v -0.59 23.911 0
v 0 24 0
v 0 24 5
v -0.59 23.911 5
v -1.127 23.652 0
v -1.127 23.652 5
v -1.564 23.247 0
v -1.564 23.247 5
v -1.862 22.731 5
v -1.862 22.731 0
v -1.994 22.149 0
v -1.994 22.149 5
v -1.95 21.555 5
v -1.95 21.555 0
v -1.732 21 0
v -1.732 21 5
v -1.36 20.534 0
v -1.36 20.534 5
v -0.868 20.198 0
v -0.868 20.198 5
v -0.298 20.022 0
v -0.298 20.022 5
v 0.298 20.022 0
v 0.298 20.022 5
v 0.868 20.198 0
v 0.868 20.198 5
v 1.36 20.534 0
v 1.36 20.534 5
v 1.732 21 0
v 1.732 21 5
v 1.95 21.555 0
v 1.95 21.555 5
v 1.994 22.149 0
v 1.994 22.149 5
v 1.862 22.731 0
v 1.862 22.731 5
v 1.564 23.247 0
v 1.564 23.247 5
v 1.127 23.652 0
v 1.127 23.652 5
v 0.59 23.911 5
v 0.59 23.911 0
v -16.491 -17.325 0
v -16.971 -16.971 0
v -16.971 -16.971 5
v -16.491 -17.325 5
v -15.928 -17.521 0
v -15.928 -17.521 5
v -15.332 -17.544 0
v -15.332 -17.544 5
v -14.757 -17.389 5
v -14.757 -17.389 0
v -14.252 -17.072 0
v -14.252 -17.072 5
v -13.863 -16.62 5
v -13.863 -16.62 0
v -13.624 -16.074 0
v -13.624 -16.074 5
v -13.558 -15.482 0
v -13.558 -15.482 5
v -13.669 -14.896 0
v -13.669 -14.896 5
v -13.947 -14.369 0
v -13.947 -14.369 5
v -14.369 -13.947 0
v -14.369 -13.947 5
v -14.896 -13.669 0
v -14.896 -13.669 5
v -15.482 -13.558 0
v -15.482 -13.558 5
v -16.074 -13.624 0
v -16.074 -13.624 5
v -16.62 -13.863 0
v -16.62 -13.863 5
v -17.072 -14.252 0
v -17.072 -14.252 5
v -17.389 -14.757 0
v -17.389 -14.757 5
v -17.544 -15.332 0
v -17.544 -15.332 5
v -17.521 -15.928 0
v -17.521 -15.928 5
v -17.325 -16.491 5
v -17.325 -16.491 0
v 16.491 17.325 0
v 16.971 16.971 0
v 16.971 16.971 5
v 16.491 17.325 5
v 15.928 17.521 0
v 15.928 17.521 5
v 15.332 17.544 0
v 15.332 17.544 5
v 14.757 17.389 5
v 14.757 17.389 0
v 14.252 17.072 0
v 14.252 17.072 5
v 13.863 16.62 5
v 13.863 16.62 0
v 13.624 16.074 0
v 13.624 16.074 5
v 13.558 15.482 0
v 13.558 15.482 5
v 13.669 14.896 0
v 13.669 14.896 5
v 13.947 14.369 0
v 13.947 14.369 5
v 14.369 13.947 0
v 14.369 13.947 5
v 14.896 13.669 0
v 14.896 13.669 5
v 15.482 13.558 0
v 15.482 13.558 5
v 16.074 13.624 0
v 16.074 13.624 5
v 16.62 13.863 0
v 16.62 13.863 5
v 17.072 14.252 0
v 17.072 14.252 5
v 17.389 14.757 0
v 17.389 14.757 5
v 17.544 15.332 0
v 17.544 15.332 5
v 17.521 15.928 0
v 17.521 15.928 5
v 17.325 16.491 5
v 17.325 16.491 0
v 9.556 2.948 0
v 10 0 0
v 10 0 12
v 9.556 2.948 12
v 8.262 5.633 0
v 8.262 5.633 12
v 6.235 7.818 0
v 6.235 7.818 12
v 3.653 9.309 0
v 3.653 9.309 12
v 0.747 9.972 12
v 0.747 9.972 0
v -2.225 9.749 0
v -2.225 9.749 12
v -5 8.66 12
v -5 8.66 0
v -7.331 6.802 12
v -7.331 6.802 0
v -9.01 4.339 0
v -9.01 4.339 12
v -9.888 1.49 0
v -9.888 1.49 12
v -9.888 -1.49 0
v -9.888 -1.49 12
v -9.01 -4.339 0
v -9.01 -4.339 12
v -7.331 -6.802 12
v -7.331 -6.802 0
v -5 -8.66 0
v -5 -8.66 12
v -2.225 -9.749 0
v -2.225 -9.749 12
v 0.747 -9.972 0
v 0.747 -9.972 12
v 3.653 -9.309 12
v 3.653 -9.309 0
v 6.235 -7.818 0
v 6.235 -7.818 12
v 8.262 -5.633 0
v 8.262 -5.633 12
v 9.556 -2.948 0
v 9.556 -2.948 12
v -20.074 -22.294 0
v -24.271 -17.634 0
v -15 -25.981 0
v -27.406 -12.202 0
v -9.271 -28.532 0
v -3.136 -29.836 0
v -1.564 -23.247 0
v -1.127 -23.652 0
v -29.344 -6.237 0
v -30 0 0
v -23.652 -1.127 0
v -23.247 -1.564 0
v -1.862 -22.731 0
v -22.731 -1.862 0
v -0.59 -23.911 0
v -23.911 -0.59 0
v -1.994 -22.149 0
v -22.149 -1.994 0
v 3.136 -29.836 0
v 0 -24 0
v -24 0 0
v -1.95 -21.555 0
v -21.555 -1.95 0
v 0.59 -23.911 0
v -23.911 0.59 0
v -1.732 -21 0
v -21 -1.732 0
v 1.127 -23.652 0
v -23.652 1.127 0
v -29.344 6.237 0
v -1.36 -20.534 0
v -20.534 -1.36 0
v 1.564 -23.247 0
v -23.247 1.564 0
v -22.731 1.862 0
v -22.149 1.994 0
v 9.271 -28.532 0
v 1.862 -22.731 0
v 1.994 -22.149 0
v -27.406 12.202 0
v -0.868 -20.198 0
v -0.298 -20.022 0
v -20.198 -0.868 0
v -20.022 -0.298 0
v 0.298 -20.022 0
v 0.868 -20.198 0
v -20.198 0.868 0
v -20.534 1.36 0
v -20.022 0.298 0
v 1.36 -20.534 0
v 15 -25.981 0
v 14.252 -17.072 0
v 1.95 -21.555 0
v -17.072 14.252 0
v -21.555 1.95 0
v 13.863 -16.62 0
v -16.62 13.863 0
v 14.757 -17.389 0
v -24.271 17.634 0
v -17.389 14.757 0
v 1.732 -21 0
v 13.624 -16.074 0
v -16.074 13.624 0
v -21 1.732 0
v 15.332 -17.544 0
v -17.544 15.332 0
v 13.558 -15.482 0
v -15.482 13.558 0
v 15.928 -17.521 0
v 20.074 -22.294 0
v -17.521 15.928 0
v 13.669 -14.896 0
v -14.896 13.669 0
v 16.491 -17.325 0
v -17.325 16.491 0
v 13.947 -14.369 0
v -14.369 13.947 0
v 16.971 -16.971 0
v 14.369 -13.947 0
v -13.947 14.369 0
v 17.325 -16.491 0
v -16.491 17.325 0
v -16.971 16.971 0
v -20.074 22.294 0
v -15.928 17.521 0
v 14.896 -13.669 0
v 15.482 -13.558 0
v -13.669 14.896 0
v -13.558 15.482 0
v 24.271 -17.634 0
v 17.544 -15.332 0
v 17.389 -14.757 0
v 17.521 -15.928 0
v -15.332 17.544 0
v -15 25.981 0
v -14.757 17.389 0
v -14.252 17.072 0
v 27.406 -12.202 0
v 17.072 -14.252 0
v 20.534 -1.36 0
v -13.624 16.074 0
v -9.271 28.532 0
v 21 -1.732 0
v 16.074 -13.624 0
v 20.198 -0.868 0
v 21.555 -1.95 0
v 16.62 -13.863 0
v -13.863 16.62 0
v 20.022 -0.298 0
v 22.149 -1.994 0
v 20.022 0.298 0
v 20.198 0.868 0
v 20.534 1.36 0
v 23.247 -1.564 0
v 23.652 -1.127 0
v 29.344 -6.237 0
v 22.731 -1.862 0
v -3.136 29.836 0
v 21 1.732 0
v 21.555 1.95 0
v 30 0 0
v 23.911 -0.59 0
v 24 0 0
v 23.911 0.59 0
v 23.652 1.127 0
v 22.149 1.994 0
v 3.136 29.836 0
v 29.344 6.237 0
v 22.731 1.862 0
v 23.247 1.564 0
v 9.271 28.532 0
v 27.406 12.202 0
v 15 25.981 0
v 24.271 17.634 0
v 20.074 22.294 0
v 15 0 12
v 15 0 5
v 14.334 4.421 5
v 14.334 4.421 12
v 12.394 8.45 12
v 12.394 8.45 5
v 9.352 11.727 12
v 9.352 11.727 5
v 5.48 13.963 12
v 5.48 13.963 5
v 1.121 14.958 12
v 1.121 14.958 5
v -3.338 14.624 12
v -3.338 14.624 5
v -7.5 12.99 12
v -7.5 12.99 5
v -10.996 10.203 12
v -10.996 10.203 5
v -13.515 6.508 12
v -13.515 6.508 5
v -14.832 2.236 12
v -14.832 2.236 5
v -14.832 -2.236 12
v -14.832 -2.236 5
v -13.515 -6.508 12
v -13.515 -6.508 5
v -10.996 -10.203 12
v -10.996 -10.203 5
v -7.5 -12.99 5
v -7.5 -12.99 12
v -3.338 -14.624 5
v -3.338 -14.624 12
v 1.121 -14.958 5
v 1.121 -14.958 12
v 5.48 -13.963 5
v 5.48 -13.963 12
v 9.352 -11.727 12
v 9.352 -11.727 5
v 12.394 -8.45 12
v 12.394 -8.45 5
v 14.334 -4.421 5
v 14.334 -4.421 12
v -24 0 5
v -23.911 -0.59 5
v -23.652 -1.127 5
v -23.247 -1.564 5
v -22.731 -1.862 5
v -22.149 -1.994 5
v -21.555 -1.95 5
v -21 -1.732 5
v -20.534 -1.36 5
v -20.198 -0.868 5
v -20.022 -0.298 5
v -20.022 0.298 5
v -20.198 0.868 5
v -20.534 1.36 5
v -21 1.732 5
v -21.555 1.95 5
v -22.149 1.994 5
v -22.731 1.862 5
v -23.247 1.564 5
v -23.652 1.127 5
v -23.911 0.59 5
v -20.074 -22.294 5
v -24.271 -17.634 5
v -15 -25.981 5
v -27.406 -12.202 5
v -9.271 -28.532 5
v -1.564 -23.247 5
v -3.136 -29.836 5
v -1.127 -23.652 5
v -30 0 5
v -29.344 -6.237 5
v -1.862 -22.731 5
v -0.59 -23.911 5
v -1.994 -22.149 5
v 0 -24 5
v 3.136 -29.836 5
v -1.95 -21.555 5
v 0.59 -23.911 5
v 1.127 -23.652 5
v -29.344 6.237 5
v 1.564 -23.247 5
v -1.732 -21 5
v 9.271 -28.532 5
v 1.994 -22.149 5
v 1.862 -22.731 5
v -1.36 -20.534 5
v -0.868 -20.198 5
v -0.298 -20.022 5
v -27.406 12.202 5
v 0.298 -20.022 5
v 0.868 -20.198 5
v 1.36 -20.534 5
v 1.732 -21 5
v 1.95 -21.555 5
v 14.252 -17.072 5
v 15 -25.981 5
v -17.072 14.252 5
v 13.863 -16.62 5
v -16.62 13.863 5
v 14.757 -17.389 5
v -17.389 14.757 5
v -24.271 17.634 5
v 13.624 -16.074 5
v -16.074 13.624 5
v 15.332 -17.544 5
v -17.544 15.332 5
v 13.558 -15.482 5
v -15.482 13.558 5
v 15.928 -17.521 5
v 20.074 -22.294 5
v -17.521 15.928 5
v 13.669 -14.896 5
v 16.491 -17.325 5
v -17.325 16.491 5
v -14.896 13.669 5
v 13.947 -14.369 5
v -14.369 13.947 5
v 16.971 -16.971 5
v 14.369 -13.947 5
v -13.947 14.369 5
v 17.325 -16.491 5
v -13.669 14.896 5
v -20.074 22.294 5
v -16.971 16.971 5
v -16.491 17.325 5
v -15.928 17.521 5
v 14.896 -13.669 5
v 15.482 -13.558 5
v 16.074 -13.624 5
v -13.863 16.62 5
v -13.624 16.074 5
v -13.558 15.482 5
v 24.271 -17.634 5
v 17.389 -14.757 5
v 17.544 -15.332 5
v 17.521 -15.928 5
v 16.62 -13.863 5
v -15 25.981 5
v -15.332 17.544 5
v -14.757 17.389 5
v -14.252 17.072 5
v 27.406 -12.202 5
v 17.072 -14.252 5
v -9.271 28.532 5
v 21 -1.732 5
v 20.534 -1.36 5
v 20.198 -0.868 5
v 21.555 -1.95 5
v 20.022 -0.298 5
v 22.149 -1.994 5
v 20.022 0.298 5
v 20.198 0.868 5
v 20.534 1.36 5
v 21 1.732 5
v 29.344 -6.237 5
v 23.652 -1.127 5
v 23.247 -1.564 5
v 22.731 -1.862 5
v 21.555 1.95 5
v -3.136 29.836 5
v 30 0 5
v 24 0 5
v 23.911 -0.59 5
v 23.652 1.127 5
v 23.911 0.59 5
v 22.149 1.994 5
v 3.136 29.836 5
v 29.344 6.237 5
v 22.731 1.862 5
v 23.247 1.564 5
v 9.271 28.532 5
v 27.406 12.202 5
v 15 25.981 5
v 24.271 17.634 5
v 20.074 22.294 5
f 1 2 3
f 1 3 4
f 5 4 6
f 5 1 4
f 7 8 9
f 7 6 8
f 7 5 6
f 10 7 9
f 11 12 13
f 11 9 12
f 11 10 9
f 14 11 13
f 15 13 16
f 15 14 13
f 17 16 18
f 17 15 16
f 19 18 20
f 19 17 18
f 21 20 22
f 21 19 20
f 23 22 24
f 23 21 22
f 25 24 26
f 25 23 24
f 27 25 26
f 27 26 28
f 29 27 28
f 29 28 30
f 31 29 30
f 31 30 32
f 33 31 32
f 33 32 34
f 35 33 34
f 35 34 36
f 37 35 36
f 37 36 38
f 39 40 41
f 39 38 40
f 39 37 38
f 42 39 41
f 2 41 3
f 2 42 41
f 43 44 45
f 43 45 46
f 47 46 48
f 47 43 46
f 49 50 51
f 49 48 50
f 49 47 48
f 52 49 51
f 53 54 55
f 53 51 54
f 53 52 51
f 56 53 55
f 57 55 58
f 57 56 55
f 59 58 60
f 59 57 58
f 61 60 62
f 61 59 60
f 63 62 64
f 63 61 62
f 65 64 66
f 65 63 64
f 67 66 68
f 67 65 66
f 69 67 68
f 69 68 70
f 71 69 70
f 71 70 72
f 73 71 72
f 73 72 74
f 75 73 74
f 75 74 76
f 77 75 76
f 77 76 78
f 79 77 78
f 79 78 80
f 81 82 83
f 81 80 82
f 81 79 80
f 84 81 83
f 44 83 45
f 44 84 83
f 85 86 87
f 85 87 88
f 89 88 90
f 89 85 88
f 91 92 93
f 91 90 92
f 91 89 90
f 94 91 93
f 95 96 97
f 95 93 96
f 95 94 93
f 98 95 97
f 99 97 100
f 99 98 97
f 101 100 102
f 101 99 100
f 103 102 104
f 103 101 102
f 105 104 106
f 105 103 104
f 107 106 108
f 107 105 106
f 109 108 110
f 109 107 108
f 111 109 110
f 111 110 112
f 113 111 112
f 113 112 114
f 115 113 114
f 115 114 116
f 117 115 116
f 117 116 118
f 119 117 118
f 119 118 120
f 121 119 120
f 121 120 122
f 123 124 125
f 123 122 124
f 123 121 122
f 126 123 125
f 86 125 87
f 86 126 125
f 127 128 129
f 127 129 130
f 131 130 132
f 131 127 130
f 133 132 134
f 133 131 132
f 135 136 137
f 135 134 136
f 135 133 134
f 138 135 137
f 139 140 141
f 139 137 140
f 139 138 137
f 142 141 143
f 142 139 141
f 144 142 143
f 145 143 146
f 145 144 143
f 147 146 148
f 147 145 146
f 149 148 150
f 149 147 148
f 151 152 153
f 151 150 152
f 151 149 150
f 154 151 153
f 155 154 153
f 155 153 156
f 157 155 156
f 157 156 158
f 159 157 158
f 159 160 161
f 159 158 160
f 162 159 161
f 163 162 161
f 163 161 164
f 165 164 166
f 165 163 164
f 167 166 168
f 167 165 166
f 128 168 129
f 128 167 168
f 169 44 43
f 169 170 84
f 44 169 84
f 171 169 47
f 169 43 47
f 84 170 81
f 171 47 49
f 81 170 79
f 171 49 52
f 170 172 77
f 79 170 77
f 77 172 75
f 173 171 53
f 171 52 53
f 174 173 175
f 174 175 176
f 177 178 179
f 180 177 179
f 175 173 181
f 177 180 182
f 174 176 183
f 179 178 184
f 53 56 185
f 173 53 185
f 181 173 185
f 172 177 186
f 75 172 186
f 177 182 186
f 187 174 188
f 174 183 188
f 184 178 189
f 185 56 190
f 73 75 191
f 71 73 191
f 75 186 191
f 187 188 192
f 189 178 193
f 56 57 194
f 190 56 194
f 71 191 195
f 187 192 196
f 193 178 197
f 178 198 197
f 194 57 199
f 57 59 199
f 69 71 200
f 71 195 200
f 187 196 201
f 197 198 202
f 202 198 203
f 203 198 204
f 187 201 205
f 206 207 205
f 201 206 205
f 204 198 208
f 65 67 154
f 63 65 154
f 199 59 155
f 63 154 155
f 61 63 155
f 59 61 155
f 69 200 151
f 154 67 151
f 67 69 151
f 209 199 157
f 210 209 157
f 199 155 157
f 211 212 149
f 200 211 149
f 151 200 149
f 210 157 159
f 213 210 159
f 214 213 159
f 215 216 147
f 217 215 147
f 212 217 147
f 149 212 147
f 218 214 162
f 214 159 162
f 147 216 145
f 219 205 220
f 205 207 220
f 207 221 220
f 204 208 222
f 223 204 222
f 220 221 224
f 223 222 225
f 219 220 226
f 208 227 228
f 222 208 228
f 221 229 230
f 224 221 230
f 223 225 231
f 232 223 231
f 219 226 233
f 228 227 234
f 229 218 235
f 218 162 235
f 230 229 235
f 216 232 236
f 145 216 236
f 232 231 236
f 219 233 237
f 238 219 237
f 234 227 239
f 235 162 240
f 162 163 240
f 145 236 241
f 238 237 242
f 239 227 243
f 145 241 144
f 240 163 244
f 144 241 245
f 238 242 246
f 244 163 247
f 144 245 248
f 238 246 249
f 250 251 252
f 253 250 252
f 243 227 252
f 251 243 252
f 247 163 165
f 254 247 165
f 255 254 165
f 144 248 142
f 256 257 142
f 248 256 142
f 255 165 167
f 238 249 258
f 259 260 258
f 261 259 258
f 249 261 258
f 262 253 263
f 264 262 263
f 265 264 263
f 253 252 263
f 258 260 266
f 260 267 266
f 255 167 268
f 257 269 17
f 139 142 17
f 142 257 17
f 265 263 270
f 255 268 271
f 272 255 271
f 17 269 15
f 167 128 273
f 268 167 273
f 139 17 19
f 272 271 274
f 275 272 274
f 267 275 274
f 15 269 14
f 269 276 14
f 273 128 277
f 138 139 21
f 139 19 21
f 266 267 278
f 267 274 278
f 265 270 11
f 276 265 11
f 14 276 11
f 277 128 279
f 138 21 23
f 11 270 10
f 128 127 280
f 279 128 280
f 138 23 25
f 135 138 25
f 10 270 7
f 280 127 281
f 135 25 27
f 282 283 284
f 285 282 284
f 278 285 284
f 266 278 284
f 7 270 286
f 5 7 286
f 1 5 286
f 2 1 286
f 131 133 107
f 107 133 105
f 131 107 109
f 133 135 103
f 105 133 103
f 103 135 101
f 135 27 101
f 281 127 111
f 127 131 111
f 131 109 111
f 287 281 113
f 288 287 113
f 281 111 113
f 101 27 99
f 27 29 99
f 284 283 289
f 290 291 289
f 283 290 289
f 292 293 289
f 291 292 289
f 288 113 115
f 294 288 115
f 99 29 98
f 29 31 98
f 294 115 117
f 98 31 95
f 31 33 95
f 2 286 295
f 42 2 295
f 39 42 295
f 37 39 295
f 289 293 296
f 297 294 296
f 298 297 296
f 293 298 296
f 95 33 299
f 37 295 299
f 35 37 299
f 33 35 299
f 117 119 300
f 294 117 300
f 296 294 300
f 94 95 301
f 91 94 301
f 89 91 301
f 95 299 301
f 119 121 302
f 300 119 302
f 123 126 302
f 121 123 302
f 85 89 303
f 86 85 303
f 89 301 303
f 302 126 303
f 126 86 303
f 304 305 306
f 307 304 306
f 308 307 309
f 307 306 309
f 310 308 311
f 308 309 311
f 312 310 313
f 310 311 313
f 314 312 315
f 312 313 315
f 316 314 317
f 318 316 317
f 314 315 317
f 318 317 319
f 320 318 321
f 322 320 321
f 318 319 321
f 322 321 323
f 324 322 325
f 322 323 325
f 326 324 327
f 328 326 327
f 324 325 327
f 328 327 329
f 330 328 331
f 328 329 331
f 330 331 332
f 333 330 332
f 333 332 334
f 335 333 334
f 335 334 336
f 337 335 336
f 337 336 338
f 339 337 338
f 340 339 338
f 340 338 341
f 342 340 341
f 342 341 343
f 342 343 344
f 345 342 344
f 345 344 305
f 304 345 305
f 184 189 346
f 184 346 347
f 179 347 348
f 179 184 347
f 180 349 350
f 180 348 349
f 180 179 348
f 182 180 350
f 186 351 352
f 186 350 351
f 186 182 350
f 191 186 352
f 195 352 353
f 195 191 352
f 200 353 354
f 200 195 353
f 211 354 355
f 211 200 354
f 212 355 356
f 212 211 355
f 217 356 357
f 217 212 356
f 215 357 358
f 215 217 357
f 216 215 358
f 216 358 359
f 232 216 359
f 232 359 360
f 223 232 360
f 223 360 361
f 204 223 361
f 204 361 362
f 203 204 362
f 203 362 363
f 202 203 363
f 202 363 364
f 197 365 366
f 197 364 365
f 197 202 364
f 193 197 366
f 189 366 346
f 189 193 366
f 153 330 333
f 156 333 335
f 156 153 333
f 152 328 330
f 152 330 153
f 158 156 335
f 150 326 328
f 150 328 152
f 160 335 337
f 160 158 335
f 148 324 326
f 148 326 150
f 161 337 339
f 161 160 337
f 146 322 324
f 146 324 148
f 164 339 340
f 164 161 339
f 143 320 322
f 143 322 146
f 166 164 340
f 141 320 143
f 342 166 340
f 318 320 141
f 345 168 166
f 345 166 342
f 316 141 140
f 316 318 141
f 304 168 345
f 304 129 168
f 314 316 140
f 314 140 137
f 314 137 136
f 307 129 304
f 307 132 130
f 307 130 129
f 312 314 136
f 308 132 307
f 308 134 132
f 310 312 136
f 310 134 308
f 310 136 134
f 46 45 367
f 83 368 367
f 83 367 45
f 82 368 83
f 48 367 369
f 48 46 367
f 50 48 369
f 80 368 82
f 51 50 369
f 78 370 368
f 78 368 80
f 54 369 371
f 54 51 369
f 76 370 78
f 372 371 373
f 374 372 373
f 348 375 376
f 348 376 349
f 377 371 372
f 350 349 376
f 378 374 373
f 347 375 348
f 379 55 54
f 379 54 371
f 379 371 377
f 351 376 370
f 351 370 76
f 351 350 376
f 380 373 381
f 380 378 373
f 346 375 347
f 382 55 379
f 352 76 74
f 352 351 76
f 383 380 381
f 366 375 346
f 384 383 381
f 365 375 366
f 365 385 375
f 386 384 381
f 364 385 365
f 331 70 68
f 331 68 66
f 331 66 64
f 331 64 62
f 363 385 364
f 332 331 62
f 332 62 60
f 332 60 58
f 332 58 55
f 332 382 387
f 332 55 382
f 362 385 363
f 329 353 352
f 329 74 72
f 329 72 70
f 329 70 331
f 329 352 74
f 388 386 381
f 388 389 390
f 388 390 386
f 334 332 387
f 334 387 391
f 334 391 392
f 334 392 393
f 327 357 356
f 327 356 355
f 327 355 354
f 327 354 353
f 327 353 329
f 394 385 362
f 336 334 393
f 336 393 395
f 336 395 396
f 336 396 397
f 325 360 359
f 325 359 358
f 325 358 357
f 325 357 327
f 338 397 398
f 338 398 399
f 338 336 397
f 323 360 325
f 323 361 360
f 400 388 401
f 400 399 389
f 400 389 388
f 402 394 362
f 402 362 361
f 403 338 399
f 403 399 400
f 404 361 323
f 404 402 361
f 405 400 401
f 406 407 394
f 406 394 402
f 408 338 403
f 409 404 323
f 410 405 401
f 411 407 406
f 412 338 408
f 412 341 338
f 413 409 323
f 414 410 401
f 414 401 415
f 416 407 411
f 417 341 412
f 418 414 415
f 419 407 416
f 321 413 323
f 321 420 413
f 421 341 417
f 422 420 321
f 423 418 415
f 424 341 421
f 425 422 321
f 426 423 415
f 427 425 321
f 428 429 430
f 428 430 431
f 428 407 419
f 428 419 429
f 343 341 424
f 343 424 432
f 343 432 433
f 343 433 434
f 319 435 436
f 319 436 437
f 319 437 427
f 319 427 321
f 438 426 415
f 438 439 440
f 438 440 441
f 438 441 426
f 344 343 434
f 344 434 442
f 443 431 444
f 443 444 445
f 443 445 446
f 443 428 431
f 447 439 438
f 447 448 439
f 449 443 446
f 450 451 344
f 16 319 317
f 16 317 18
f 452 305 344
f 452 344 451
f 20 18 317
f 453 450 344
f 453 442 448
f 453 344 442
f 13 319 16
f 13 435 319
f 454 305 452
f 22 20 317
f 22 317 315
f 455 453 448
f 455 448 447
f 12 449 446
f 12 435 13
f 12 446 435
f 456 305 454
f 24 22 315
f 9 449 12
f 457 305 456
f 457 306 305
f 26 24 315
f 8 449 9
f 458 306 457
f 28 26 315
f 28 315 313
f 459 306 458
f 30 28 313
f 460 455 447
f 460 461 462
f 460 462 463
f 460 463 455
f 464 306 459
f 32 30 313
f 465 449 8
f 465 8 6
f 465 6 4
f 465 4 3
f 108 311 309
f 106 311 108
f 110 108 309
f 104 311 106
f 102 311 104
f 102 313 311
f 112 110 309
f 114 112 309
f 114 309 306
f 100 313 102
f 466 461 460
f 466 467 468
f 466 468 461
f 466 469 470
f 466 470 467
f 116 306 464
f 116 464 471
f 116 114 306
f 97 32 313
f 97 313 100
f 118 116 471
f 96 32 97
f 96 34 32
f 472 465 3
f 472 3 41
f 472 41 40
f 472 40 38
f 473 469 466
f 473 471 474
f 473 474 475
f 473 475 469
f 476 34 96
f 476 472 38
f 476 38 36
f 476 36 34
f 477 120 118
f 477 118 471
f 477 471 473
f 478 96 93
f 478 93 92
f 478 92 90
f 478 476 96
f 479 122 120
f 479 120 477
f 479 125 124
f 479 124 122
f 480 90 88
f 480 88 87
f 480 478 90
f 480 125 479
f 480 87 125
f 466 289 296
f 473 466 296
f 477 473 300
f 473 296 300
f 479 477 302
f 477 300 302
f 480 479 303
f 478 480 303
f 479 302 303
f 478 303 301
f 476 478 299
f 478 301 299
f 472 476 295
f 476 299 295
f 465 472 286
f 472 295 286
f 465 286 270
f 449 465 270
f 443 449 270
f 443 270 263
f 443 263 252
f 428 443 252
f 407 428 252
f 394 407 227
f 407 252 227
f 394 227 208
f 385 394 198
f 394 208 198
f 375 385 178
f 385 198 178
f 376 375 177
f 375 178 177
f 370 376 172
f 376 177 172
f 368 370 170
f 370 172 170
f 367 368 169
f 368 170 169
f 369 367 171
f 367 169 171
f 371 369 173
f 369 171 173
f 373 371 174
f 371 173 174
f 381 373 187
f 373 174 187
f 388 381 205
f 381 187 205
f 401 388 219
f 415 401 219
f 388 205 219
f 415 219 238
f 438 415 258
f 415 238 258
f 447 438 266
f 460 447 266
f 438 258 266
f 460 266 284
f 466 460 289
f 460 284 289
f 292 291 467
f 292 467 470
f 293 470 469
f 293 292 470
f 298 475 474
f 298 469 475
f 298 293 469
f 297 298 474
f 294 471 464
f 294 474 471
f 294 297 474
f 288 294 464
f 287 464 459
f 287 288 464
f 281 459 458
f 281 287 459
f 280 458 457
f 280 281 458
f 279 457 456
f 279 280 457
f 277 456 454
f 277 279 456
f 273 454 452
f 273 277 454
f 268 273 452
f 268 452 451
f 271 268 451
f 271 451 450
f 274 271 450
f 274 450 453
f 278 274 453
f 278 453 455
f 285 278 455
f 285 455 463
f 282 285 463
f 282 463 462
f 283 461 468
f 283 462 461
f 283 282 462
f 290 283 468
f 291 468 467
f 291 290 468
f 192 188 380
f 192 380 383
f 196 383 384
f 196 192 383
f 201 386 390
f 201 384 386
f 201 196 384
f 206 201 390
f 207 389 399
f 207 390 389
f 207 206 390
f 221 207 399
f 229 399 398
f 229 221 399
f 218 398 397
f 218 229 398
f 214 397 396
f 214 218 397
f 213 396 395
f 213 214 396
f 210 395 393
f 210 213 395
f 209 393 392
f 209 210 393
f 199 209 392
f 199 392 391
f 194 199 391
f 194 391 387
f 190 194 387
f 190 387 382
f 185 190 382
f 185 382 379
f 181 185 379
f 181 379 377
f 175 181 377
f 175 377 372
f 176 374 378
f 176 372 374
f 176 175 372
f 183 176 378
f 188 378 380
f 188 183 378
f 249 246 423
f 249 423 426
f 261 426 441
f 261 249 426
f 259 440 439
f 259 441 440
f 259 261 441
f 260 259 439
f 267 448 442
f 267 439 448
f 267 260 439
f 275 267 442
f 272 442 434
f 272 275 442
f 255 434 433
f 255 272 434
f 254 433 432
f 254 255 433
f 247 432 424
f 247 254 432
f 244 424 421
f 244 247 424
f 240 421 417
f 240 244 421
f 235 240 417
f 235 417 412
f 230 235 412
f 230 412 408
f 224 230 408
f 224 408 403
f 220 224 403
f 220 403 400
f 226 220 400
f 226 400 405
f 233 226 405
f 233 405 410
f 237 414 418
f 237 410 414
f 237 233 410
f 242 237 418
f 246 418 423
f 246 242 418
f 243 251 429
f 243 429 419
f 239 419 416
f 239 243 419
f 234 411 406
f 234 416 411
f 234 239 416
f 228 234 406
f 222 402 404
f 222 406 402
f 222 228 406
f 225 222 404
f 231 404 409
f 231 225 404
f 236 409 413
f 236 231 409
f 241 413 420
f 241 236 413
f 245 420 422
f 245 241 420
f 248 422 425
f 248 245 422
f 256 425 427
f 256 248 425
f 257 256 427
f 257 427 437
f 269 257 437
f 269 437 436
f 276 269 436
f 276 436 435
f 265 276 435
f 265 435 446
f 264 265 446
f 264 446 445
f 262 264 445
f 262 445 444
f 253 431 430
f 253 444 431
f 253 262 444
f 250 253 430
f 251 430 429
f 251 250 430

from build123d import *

# Parameters (mm, degrees)
CYLINDER003_R     = 2
CYLINDER003_DEPTH = 10
ARRAY001_COUNT    = 8
CYLINDER002_R     = 10
CYLINDER002_DEPTH = 30
CYLINDER_R        = 30
CYLINDER_DEPTH    = 5
CYLINDER001_R     = 15
CYLINDER001_DEPTH = 12


with BuildPart() as array001:
    # Cylinder003 → Cylinder003 (new body)
    with BuildSketch(Plane(origin=(22, 0, -2), x_dir=(1, 0, 0), z_dir=(0, 0, 1))):
        Circle(CYLINDER003_R)
    extrude(amount=CYLINDER003_DEPTH)

    # Array001: Array001 ×8 about axis
    array001_axis = Axis((0, 0, 1), (0, 0, 1))


with BuildPart() as array001_1:
    add(array001.part)
    for i in range(1, ARRAY001_COUNT):
        add(array001.part.rotate(array001_axis, i * 360 / ARRAY001_COUNT))


with BuildPart() as int:
    # Cylinder002 → Cylinder002 (new body)
    with BuildSketch(Plane.XY.offset(-2)):
        Circle(CYLINDER002_R)
    extrude(amount=CYLINDER002_DEPTH)


with BuildPart() as basis:
    # Cylinder → Cylinder (new body)
    with BuildSketch(Plane.XY):
        Circle(CYLINDER_R)
    extrude(amount=CYLINDER_DEPTH)


with BuildPart() as flange:
    # Cylinder001 → Cylinder001 (new body)
    with BuildSketch(Plane.XY):
        Circle(CYLINDER001_R)
    extrude(amount=CYLINDER001_DEPTH)

    # Fusion: union basis
    add(basis.part)

    # Cut: cut int
    add(int.part, mode=Mode.SUBTRACT)

    # Cut001: cut Array001
    add(array001_1.part, mode=Mode.SUBTRACT)


solid = flange.part
